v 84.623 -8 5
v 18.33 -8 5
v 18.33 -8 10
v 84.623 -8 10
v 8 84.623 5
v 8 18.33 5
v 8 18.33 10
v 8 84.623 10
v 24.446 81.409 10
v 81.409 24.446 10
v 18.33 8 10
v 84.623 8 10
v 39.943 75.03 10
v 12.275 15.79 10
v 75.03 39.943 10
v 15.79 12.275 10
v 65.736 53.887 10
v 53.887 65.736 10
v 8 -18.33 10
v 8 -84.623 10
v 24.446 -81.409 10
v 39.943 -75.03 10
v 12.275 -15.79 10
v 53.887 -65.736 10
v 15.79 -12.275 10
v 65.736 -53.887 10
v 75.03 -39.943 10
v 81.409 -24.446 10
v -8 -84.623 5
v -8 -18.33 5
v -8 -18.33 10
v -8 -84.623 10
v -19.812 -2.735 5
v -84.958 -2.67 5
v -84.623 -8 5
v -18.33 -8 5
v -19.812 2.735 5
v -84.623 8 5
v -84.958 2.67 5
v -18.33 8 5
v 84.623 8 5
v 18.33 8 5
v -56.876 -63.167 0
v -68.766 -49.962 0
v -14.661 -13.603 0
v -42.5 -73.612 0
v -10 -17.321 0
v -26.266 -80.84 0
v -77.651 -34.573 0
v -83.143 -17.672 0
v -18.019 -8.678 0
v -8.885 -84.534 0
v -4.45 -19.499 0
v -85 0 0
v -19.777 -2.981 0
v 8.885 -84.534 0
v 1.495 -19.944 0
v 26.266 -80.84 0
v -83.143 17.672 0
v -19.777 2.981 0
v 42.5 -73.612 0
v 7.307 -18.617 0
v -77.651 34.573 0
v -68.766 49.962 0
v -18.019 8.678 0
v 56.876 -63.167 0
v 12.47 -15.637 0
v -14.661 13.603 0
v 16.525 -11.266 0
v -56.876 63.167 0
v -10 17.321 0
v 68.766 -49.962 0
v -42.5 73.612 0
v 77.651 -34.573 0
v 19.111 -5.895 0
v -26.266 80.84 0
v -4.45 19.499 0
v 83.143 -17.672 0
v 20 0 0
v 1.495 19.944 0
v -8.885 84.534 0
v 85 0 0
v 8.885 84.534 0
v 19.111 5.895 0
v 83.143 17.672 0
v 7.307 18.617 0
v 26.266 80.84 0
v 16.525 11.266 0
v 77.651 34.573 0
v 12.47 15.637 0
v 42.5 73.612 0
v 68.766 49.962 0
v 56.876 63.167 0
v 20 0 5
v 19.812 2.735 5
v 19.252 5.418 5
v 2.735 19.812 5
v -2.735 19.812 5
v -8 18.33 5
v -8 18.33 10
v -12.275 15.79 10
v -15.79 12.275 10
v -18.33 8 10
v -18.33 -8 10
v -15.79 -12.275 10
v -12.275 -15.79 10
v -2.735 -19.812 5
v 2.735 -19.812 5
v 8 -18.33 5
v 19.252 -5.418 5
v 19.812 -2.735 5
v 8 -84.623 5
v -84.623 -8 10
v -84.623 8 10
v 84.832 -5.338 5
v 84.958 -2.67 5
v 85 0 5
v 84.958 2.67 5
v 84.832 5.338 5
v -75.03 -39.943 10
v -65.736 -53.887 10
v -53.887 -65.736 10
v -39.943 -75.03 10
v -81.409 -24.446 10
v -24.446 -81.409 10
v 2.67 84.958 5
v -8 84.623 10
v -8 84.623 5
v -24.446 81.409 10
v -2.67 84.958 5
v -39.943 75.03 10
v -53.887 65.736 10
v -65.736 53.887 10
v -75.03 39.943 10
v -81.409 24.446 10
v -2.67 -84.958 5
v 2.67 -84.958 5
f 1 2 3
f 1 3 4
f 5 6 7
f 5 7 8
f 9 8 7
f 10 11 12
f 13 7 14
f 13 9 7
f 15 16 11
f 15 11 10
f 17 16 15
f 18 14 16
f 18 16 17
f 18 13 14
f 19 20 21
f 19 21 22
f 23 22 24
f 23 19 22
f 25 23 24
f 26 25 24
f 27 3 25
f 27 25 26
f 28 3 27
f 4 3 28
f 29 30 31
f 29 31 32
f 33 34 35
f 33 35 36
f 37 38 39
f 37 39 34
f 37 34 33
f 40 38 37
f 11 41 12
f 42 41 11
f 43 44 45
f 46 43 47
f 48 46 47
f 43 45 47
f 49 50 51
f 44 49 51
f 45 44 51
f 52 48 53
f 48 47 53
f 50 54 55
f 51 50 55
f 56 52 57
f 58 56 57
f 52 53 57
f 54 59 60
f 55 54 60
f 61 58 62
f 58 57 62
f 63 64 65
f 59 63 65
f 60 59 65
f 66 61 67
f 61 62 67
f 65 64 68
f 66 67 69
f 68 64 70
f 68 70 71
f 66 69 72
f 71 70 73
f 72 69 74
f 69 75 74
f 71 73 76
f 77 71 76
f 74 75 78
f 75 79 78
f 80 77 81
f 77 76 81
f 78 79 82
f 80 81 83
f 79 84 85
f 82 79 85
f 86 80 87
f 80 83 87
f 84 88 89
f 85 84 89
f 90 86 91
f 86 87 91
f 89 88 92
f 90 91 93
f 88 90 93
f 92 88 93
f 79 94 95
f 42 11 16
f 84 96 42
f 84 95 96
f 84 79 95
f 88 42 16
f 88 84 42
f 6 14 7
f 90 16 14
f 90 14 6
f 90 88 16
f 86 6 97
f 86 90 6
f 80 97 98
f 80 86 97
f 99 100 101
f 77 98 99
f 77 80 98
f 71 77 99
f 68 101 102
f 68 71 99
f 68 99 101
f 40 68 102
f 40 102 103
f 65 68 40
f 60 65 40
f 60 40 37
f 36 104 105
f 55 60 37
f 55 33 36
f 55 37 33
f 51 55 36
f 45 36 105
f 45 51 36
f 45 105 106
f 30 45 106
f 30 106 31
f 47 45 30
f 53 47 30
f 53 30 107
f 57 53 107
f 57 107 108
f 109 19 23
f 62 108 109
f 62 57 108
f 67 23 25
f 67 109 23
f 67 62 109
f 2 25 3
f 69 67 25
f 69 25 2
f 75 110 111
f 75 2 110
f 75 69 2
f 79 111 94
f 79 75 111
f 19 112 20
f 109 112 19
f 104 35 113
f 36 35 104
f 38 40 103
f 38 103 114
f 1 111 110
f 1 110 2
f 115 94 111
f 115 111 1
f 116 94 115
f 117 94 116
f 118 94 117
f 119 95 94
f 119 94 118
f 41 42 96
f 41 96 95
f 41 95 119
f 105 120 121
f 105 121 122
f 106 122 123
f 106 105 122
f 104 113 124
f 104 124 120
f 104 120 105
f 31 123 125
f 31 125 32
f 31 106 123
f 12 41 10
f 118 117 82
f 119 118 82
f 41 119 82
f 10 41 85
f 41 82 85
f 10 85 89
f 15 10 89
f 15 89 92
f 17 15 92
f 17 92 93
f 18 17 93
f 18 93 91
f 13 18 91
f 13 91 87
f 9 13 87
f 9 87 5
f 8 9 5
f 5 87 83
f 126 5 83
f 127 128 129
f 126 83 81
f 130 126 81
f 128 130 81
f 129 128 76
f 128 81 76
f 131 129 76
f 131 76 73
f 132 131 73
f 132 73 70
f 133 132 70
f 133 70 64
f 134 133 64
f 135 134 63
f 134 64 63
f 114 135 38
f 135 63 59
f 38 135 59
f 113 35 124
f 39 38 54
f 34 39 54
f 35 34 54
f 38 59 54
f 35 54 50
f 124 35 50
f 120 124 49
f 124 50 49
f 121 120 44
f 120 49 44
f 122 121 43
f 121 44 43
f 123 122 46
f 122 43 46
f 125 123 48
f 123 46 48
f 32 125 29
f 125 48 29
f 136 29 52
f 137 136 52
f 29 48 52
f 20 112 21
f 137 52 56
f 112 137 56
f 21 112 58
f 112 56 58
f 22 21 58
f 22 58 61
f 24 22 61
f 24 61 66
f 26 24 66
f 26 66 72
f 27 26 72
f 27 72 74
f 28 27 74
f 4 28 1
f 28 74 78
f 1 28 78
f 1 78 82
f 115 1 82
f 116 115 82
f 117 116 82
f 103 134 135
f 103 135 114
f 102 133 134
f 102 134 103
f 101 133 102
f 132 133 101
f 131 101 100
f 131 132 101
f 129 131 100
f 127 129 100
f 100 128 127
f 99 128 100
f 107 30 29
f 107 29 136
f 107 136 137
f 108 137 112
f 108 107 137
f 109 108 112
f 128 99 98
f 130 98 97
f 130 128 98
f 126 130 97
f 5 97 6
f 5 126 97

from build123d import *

# Parameters (mm, degrees)
SKETCH2_R           = 85
SKETCH2_R_2         = 20
BOSS_EXTRUDE1_DEPTH = 10
CUT_EXTRUDE1_START  = -5
CUT_EXTRUDE1_DEPTH  = 5


with BuildPart() as part:
    # Sketch2 → Boss-Extrude1 (new body)
    with BuildSketch(Plane.XY):
        Circle(SKETCH2_R)
        Circle(SKETCH2_R_2, mode=Mode.SUBTRACT)
    extrude(amount=BOSS_EXTRUDE1_DEPTH)

    # Sketch3 → Cut-Extrude1 (cut)
    with BuildSketch(Plane.XY.offset(10).offset(CUT_EXTRUDE1_START)):
        with BuildLine():
            Line((-18.33030278, 8), (-84.622691992, 8))
            ThreePointArc((-84.622691992, 8), (-85, 0), (-84.622691992, -8))
            Line((-84.622691992, -8), (-18.33030278, -8))
            ThreePointArc((-18.33030278, -8), (-20, 0), (-18.33030278, 8))
        make_face()
        with BuildLine():
            ThreePointArc((85, 0), (84.905620601, 4.00444632), (84.622691992, 8))
            Line((84.622691992, 8), (18.33030278, 8))
            ThreePointArc((18.33030278, 8), (19.578126259, 4.086192874), (20, 0))
            ThreePointArc((20, 0), (19.578126259, -4.086192874), (18.33030278, -8))
            Line((18.33030278, -8), (84.622691992, -8))
            ThreePointArc((84.622691992, -8), (84.905620601, -4.00444632), (85, 0))
        make_face()
        with BuildLine():
            ThreePointArc((8, 84.622691992), (0, 85), (-8, 84.622691992))
            Line((-8, 84.622691992), (-8, 18.33030278))
            ThreePointArc((-8, 18.33030278), (0, 20), (8, 18.33030278))
            Line((8, 18.33030278), (8, 84.622691992))
        make_face()
        with BuildLine():
            Line((-8, -18.33030278), (-8, -84.622691992))
            ThreePointArc((-8, -84.622691992), (0, -85), (8, -84.622691992))
            Line((8, -84.622691992), (8, -18.33030278))
            ThreePointArc((8, -18.33030278), (0, -20), (-8, -18.33030278))
        make_face()
    extrude(amount=CUT_EXTRUDE1_DEPTH, mode=Mode.SUBTRACT)


solid = part.part
